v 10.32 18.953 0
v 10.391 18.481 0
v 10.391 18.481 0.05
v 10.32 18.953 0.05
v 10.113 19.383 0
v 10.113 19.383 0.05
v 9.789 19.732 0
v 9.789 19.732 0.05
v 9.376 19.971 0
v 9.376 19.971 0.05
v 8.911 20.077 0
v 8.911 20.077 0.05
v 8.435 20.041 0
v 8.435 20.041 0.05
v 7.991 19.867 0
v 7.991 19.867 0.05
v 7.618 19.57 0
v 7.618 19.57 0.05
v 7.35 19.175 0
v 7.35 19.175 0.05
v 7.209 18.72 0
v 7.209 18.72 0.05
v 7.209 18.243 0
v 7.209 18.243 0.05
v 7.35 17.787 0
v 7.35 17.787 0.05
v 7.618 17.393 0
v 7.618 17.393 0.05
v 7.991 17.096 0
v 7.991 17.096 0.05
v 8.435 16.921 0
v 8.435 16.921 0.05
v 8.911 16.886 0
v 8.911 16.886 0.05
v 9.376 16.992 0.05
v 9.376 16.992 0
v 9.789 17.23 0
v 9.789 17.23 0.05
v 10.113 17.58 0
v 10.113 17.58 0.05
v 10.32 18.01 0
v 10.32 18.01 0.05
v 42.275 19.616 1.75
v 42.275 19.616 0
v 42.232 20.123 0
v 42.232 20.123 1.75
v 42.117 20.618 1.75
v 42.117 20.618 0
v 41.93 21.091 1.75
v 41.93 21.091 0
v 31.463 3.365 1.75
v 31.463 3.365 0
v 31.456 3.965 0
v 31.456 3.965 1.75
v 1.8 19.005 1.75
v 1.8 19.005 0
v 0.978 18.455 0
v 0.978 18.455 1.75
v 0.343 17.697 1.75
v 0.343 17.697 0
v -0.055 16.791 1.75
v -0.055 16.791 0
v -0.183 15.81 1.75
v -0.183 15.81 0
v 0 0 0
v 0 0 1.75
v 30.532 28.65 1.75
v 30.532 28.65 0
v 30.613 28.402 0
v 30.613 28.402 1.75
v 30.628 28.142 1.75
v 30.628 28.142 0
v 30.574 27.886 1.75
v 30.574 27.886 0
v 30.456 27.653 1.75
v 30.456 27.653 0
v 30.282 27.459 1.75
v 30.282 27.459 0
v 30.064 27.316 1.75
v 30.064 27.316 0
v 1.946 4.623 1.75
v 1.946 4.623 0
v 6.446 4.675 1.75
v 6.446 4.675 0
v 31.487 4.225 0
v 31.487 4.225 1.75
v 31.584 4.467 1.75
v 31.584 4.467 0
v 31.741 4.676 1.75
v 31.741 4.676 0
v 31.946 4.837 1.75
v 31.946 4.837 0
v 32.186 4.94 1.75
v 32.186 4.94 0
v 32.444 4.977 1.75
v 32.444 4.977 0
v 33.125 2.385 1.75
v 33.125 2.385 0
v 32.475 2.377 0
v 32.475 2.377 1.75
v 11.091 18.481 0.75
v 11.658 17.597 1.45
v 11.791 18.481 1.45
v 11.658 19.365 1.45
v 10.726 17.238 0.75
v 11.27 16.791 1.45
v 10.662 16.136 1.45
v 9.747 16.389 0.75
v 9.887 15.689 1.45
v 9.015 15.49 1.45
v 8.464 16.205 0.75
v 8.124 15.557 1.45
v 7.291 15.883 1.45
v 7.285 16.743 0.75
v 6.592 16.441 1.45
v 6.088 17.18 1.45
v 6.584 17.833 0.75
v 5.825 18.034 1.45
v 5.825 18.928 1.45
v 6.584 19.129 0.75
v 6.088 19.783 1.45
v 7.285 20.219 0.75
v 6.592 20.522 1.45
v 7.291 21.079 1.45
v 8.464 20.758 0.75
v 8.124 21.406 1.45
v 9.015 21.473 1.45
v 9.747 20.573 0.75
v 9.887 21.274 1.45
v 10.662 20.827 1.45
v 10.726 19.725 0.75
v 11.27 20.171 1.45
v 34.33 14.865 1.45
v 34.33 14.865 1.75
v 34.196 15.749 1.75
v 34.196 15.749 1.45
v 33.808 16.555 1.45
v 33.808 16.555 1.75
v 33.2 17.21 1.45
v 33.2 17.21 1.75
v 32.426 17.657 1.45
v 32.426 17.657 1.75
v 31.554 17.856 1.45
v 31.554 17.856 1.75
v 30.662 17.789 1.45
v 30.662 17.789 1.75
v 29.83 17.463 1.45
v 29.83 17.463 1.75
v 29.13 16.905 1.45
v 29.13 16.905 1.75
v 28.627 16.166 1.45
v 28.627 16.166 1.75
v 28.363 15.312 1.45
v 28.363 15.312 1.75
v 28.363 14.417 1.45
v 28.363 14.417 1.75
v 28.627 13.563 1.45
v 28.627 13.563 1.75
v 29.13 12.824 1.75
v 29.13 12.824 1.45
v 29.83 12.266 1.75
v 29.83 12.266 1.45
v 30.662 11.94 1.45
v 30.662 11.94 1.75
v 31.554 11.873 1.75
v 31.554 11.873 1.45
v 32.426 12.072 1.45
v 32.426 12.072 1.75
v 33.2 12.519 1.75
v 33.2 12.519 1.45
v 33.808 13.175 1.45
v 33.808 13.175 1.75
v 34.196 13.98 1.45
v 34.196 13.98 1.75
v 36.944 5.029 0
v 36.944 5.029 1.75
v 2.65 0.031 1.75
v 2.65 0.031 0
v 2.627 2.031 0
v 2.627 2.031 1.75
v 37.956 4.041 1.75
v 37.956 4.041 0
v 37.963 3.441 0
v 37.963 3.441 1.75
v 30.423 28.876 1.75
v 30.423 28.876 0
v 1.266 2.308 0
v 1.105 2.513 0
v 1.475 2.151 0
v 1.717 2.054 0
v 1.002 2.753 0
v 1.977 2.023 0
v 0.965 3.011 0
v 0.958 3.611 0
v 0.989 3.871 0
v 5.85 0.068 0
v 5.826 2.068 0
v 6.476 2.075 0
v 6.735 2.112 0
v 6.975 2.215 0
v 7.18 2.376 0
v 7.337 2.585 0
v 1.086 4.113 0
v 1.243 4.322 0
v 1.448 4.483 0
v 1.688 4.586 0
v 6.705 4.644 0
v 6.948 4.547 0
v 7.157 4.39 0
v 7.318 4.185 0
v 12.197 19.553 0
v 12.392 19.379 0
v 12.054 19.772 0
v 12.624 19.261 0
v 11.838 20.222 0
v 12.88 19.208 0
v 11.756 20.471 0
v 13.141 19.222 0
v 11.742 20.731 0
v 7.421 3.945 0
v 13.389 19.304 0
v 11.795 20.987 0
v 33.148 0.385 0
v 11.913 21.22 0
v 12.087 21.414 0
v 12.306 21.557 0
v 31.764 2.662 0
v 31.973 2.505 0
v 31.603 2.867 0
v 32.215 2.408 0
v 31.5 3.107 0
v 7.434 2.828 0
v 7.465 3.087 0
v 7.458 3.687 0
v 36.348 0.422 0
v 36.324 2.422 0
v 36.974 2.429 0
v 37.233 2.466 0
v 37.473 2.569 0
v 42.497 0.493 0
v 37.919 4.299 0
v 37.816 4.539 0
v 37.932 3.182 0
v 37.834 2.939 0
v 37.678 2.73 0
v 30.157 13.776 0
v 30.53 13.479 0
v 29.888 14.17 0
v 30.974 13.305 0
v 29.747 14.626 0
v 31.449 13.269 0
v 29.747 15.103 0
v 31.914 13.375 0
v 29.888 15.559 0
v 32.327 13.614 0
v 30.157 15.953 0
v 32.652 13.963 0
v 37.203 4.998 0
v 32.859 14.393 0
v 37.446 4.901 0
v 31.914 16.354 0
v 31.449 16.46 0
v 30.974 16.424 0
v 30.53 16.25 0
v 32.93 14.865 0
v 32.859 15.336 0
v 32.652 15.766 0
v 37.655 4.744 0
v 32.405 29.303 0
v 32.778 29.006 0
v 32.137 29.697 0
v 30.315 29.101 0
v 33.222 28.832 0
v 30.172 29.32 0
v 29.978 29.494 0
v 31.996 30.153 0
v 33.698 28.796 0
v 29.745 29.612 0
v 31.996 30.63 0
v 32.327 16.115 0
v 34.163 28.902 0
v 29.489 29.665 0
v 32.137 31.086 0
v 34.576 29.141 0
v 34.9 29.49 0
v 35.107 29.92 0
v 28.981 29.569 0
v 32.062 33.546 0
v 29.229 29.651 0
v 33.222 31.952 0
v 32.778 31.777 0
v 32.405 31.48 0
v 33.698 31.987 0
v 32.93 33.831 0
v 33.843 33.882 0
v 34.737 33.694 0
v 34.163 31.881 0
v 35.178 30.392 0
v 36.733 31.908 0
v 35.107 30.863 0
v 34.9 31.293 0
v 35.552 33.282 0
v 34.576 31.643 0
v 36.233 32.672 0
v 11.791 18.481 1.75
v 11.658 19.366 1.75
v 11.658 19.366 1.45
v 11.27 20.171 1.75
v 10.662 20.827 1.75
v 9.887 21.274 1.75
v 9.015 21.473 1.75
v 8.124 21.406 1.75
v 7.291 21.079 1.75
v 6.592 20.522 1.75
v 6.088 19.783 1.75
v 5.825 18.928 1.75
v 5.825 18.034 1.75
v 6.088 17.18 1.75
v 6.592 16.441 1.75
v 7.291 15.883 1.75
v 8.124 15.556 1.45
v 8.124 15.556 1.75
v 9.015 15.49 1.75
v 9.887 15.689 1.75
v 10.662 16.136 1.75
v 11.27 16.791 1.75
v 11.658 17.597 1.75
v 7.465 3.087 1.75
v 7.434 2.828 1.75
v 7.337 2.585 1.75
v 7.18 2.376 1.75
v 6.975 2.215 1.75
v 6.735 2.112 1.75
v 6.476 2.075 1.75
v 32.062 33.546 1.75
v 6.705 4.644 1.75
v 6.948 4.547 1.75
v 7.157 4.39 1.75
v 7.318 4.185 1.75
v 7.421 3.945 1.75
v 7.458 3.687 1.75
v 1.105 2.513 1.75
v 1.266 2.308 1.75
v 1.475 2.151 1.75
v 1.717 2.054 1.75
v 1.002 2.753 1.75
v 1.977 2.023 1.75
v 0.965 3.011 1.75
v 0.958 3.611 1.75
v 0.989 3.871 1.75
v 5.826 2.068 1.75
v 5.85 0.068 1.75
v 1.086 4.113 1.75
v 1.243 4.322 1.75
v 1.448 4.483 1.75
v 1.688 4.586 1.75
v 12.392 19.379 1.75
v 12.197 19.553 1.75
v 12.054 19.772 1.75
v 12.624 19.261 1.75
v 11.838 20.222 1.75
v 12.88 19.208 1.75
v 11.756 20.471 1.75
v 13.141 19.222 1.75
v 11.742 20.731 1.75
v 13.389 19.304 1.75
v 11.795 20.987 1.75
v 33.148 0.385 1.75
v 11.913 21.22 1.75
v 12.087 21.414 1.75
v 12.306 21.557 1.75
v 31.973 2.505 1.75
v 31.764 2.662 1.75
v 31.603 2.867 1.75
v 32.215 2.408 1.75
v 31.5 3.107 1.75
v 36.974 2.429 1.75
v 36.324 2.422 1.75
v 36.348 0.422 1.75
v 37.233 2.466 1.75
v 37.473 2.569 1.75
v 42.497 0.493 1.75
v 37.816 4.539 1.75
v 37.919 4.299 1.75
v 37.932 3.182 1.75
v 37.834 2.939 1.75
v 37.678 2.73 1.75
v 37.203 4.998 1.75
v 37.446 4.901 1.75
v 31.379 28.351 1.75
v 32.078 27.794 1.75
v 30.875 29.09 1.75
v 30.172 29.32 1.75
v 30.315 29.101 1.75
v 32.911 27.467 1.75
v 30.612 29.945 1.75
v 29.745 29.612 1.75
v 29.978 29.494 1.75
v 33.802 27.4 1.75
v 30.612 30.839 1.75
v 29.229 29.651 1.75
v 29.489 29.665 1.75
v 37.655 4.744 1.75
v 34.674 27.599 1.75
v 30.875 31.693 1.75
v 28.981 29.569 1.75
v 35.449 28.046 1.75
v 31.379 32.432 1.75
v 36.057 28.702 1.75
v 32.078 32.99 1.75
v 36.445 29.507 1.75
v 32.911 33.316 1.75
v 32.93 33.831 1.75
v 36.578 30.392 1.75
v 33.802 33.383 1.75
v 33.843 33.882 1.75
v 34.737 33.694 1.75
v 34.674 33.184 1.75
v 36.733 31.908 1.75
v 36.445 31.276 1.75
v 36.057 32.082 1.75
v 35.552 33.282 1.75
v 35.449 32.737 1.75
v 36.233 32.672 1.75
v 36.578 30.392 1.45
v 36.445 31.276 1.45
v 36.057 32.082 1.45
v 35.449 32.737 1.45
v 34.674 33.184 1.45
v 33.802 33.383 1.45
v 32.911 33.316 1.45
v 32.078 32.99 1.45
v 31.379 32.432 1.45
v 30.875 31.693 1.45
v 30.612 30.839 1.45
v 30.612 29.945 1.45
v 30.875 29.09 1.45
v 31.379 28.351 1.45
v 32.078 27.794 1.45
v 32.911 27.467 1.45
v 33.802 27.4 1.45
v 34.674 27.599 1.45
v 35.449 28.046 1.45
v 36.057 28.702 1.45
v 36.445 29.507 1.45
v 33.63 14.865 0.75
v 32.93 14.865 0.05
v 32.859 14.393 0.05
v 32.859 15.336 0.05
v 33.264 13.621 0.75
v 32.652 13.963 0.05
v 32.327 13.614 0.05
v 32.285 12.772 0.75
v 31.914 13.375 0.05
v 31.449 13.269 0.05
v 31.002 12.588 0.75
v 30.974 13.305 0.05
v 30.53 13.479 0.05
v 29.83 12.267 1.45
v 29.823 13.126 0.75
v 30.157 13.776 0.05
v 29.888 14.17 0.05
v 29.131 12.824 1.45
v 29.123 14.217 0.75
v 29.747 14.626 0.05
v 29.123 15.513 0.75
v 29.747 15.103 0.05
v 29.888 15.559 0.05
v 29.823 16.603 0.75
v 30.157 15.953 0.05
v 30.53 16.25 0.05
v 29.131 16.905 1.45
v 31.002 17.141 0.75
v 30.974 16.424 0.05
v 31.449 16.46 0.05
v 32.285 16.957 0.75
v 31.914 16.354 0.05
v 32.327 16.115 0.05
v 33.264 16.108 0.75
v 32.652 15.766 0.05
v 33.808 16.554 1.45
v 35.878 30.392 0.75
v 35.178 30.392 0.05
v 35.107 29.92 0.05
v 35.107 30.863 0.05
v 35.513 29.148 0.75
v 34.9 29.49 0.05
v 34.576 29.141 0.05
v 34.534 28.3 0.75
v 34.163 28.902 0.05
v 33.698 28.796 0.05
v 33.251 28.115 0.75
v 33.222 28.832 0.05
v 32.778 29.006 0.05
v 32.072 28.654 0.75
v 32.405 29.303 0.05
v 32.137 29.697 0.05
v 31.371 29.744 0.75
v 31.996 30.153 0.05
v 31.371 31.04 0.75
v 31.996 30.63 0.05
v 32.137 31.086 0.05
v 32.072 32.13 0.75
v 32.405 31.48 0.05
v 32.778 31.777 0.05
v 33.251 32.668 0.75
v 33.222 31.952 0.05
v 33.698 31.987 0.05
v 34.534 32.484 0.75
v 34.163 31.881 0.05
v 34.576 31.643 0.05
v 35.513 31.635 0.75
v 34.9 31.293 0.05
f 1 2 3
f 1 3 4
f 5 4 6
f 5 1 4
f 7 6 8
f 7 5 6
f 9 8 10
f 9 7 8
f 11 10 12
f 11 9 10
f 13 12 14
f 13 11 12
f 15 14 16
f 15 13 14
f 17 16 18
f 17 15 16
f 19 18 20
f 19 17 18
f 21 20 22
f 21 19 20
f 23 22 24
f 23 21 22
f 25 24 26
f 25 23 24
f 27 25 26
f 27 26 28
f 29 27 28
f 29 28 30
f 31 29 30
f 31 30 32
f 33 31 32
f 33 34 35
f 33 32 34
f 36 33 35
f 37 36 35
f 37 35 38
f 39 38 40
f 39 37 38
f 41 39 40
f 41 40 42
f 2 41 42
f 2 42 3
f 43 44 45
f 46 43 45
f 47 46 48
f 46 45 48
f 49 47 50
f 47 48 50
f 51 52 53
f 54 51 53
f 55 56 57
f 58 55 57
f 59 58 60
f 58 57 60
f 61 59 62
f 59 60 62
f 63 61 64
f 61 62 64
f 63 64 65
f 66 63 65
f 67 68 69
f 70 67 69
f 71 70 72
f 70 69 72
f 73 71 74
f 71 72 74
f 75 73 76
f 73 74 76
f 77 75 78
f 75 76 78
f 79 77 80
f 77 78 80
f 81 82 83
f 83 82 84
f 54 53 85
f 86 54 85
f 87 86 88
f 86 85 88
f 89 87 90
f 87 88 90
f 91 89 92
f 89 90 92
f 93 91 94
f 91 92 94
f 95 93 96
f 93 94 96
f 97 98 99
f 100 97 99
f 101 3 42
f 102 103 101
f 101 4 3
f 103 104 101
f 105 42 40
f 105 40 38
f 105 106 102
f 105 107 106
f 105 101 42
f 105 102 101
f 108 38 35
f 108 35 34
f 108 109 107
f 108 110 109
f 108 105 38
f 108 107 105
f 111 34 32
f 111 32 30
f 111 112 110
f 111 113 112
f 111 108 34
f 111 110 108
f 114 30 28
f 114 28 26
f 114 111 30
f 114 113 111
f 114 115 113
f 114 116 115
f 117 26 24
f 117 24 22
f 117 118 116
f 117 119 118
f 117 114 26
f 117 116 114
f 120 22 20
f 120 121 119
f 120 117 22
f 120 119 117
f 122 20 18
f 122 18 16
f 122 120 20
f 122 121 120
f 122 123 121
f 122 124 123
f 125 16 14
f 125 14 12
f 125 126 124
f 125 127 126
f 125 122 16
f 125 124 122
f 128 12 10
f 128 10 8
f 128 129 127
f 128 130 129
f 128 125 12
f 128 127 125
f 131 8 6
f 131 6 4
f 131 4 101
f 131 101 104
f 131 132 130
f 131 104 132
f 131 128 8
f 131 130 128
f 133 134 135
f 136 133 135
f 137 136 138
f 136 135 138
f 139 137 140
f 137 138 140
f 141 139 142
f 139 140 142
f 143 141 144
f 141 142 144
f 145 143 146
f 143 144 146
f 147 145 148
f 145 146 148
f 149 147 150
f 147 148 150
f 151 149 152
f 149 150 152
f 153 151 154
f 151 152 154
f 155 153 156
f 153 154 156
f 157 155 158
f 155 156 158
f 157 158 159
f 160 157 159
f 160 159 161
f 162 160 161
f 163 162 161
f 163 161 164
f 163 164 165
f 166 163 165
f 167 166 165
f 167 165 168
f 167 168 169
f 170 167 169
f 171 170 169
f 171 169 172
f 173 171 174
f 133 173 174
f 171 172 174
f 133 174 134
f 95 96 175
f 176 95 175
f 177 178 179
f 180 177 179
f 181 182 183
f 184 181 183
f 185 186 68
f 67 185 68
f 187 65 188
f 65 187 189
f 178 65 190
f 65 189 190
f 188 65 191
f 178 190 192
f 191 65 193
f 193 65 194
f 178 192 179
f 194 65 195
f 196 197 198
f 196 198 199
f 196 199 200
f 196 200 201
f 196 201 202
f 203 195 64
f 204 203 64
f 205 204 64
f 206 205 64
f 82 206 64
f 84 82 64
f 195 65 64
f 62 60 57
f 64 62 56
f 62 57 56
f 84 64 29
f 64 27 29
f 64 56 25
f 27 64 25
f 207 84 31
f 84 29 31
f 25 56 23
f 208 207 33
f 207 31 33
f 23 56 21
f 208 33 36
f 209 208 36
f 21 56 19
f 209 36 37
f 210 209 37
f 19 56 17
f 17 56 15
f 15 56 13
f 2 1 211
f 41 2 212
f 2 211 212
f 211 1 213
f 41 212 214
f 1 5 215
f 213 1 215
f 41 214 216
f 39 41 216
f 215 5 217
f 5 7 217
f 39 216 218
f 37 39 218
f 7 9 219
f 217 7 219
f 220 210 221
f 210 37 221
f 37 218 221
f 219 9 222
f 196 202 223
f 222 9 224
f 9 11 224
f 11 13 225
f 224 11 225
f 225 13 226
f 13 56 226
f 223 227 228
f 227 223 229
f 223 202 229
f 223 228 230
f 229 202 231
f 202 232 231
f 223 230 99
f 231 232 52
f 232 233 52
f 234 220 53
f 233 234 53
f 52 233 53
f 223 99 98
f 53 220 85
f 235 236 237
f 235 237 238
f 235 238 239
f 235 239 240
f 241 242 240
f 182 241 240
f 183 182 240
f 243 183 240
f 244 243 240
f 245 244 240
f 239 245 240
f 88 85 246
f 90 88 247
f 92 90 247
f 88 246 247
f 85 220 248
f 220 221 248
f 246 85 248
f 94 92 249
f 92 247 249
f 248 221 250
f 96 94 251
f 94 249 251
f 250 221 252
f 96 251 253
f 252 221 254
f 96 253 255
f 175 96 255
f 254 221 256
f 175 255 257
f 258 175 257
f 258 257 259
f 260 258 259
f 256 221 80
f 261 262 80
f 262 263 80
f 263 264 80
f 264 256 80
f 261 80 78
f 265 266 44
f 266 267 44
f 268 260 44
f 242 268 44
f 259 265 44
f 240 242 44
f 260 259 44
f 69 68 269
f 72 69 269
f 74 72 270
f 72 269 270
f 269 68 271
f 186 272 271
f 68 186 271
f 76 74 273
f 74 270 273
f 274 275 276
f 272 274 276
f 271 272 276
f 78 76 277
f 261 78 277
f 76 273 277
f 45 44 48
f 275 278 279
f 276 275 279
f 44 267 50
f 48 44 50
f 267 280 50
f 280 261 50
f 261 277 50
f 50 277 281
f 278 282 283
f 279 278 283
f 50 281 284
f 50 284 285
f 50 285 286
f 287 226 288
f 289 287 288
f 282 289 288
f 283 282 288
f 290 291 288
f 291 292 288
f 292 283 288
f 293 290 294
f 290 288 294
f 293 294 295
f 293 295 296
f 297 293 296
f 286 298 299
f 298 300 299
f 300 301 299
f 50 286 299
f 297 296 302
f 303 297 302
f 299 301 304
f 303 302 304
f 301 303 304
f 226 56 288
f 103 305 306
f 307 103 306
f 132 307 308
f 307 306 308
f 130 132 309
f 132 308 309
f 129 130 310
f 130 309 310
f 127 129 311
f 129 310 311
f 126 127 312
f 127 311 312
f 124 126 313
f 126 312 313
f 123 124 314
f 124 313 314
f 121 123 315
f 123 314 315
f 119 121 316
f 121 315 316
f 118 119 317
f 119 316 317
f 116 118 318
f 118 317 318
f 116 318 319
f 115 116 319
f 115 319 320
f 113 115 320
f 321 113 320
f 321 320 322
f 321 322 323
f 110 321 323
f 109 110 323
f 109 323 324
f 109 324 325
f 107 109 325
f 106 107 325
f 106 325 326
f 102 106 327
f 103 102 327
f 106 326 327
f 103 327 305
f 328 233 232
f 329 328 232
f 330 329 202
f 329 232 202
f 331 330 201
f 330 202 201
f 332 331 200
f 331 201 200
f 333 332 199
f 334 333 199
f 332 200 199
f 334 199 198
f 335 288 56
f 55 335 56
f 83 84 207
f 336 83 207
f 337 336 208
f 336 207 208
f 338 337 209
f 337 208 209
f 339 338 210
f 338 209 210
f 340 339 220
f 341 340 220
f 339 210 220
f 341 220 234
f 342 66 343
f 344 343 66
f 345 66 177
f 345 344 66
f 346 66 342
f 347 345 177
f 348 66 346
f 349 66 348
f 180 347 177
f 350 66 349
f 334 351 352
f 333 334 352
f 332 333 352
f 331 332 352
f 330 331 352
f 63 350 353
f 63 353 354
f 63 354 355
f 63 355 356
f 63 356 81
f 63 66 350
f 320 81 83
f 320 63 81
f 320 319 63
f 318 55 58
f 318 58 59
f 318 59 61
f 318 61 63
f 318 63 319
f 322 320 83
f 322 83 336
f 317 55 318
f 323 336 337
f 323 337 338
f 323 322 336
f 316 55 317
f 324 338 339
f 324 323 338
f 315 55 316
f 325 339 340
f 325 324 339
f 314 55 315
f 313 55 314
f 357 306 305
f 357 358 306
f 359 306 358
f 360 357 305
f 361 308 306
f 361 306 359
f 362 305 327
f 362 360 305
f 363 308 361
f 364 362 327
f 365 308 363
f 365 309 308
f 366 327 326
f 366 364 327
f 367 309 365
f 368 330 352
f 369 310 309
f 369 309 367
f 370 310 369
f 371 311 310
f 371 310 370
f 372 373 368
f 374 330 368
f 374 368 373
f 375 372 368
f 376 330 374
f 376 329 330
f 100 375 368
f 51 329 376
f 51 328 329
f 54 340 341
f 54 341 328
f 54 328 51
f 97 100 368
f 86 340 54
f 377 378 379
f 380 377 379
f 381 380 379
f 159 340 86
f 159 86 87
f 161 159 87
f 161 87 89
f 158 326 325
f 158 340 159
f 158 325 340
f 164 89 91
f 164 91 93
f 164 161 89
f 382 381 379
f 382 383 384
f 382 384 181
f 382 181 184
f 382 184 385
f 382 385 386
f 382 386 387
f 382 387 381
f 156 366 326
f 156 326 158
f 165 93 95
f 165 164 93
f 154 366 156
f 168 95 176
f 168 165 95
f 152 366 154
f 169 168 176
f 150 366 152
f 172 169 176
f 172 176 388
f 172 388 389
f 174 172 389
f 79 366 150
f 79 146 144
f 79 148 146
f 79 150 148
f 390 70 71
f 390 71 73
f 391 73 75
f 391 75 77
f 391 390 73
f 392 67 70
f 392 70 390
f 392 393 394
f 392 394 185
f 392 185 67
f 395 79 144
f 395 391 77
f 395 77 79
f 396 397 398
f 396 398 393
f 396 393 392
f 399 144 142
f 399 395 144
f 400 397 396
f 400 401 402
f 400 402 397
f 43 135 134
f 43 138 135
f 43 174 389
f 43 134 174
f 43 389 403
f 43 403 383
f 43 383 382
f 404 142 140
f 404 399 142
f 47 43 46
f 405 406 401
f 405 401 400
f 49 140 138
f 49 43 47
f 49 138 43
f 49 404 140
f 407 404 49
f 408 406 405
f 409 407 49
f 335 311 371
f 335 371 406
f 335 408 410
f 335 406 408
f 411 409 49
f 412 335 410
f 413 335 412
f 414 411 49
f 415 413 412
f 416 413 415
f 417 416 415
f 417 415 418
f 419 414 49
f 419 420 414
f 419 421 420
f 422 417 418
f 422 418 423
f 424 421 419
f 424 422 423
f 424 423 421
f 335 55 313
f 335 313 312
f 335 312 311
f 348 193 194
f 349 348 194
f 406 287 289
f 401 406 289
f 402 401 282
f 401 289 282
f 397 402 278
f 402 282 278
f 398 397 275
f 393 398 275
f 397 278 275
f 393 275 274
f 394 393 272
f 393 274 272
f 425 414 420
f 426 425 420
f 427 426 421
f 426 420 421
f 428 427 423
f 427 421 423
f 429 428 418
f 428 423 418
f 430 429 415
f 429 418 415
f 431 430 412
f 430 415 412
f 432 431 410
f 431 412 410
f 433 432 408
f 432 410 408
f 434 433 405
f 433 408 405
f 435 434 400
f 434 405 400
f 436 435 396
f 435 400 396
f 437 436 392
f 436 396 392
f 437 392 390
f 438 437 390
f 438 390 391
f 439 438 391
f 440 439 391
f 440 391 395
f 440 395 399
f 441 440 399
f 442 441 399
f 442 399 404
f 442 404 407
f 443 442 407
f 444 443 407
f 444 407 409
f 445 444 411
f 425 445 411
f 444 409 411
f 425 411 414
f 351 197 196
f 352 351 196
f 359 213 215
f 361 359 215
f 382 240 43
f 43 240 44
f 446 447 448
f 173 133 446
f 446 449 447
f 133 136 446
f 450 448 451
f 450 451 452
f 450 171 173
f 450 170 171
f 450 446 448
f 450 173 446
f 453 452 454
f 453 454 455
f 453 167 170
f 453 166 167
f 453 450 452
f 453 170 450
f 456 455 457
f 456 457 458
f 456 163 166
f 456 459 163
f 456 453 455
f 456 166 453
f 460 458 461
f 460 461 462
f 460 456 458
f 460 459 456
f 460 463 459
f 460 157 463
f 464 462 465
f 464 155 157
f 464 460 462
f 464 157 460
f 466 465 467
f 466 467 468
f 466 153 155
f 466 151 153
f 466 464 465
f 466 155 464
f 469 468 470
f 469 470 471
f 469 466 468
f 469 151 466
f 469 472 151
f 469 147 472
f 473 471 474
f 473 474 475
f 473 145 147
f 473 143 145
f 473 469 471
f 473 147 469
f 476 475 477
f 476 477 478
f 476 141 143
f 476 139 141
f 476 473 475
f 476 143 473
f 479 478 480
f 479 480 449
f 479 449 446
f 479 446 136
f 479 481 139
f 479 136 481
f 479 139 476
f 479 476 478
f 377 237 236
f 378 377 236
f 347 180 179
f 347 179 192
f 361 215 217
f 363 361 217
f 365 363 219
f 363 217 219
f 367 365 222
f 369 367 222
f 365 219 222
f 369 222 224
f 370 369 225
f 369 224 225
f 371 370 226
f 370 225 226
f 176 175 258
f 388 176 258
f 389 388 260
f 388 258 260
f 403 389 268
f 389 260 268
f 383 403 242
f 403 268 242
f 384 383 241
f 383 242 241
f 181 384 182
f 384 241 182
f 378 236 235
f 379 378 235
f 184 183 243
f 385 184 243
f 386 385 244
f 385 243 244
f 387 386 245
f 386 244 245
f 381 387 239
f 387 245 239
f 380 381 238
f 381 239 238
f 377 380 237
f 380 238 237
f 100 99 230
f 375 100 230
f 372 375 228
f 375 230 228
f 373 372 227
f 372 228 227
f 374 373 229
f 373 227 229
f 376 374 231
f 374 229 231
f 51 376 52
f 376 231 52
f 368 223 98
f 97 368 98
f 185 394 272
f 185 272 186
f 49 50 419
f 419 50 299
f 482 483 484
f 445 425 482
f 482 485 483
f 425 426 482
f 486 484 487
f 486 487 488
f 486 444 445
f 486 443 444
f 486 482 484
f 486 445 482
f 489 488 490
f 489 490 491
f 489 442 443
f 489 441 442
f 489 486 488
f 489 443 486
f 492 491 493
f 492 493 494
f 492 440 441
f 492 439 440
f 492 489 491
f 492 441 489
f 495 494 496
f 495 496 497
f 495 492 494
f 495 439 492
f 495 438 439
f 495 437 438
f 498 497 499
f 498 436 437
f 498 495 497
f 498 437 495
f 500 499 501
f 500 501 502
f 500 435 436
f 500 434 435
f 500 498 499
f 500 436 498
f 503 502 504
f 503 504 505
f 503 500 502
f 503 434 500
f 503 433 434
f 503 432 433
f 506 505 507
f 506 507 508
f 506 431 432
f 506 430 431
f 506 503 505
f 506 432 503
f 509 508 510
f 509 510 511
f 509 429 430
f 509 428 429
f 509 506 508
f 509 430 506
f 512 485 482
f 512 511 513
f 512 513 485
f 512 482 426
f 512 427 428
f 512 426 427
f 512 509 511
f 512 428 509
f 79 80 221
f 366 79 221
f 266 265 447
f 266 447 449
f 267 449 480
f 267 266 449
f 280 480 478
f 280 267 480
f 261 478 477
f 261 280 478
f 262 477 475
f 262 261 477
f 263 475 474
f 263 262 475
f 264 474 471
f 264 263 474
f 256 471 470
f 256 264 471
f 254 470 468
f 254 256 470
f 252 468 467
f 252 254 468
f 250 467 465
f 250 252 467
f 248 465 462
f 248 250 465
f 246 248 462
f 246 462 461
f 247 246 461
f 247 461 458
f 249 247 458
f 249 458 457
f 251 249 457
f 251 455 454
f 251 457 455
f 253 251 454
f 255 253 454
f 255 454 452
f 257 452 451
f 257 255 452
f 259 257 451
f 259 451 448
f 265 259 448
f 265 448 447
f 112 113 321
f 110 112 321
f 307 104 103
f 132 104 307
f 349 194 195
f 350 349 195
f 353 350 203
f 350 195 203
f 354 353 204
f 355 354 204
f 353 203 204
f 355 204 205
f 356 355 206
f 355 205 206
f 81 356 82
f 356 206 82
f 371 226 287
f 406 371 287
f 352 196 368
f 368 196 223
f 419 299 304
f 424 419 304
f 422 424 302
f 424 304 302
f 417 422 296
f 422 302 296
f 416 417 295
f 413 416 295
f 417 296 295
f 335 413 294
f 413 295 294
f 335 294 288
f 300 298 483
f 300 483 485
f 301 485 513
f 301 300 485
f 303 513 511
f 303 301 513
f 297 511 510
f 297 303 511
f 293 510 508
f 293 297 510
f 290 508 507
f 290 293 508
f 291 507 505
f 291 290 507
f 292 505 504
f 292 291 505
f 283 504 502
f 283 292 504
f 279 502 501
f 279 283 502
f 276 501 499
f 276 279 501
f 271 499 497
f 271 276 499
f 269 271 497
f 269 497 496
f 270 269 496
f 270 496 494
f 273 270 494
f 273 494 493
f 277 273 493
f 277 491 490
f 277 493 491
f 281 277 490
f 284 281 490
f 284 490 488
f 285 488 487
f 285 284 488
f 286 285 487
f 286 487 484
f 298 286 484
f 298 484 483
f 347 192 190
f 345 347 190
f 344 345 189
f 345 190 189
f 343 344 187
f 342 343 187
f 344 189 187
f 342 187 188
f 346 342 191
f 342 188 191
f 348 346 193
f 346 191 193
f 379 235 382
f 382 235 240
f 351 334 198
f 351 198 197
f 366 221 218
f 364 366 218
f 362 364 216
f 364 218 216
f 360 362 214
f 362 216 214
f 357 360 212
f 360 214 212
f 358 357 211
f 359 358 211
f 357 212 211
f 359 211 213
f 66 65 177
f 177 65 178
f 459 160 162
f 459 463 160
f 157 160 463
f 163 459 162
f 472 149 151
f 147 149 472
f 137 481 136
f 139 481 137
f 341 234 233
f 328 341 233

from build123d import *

# Parameters (mm, degrees)
SKETCH2_R           = 1.6
SKETCH2_R_2         = 3.5
BOSS_EXTRUDE1_DEPTH = 1.75
SKETCH3_R           = 3
CUT_EXTRUDE2_DEPTH  = 0.3
CHAMFER1_SIZE       = 1.4


with BuildPart() as part:
    # Sketch2 → Boss-Extrude1 (new body)
    # profile 1 of 4: a face of its own
    with BuildSketch(Plane(origin=(277.94406545, -368.782269, 0), x_dir=(0.99993266408239, 0.011604624125499034, 0), z_dir=(0, 0, 1))):
        with BuildLine():
            Line((-273.645770216, 387.793792834), (-273.645770216, 371.982873115))
            Line((-273.645770216, 371.982873115), (-270.995770216, 371.982873115))
            Line((-270.995770216, 371.982873115), (-270.995770216, 373.982873115))
            Line((-270.995770216, 373.982873115), (-271.645770216, 373.982873115))
            ThreePointArc((-271.645770216, 373.982873115), (-272.352876997, 374.275766334), (-272.645770216, 374.982873115))
            Line((-272.645770216, 374.982873115), (-272.645770216, 375.582873115))
            ThreePointArc((-272.645770216, 375.582873115), (-272.352876997, 376.289979896), (-271.645770216, 376.582873115))
            Line((-271.645770216, 376.582873115), (-267.145770216, 376.582873115))
            ThreePointArc((-267.145770216, 376.582873115), (-266.438663434, 376.289979896), (-266.145770216, 375.582873115))
            Line((-266.145770216, 375.582873115), (-266.145770216, 374.982873115))
            ThreePointArc((-266.145770216, 374.982873115), (-266.438663434, 374.275766334), (-267.145770216, 373.982873115))
            Line((-267.145770216, 373.982873115), (-267.795770216, 373.982873115))
            Line((-267.795770216, 373.982873115), (-267.795770216, 371.982873115))
            Line((-267.795770216, 371.982873115), (-240.495770216, 371.982873115))
            Line((-240.495770216, 371.982873115), (-240.495770216, 373.982873115))
            Line((-240.495770216, 373.982873115), (-241.145770216, 373.982873115))
            ThreePointArc((-241.145770216, 373.982873115), (-241.852876997, 374.275766334), (-242.145770216, 374.982873115))
            Line((-242.145770216, 374.982873115), (-242.145770216, 375.582873115))
            ThreePointArc((-242.145770216, 375.582873115), (-241.852876997, 376.289979896), (-241.145770216, 376.582873115))
            Line((-241.145770216, 376.582873115), (-236.645770216, 376.582873115))
            ThreePointArc((-236.645770216, 376.582873115), (-235.938663434, 376.289979896), (-235.645770216, 375.582873115))
            Line((-235.645770216, 375.582873115), (-235.645770216, 374.982873115))
            ThreePointArc((-235.645770216, 374.982873115), (-235.938663434, 374.275766334), (-236.645770216, 373.982873115))
            Line((-236.645770216, 373.982873115), (-237.295770216, 373.982873115))
            Line((-237.295770216, 373.982873115), (-237.295770216, 371.982873115))
            Line((-237.295770216, 371.982873115), (-231.145770216, 371.982873115))
            Line((-231.145770216, 371.982873115), (-231.145770216, 391.107179671))
            ThreePointArc((-231.145770216, 391.107179671), (-238.062806241, 390.349641022), (-231.473692961, 392.586343587))
            Line((-231.473692961, 392.586343587), (-236.545112102, 403.462037031))
            ThreePointArc((-236.545112102, 403.462037031), (-236.300153332, 402.740411764), (-236.217189356, 401.982873115))
            ThreePointArc((-236.217189356, 401.982873115), (-238.959651202, 398.565836981), (-242.889267039, 400.503710116))
            ThreePointArc((-242.889267039, 400.503710116), (-243.006113356, 403.179944092), (-241.196353273, 405.15495037))
            Line((-241.196353273, 405.15495037), (-271.624933816, 390.965870235))
            ThreePointArc((-271.624933816, 390.965870235), (-268.26522144, 390.745662801), (-266.645770216, 387.793792834))
            ThreePointArc((-266.645770216, 387.793792834), (-270.145770216, 384.293792834), (-273.645770216, 387.793792834))
        make_face()
        with Locations(Location((-242.145770216, 386.482873115, 0), (0, 0, 359.335089091))):
            Circle(SKETCH2_R, mode=Mode.SUBTRACT)
        with Locations(Location((-264.6406535, 390.360870917, 0), (0, 0, 359.335089091))):
            Circle(SKETCH2_R, mode=Mode.SUBTRACT)
        with BuildLine():
            Line((-242.994921177, 400.730286146), (-242.889267039, 400.503710116))
            Line((-242.889267039, 400.503710116), (-242.783612046, 400.277132252))
            ThreePointArc((-242.783612046, 400.277132252), (-242.750227212, 399.512493847), (-243.267301571, 398.948206203))
            Line((-243.267301571, 398.948206203), (-260.033995631, 391.129768361))
            ThreePointArc((-260.033995631, 391.129768361), (-260.798634036, 391.096383528), (-261.36292168, 391.613457887))
            Line((-261.36292168, 391.613457887), (-261.574230811, 392.06661178))
            ThreePointArc((-261.574230811, 392.06661178), (-261.607615645, 392.831250185), (-261.090541285, 393.395537829))
            Line((-261.090541285, 393.395537829), (-244.323847225, 401.213975671))
            ThreePointArc((-244.323847225, 401.213975671), (-243.55920882, 401.247360505), (-242.994921177, 400.730286146))
        make_face(mode=Mode.SUBTRACT)
    # profile 2 of 4: a face of its own
    with BuildSketch(Plane(origin=(277.94406545, -368.782269, 0), x_dir=(0.99993266408239, 0.011604624125499034, 0), z_dir=(0, 0, 1))):
        with Locations((-270.145770216, 387.793792834)):
            Circle(SKETCH2_R_2)
    # profile 3 of 4: a face of its own
    with BuildSketch(Plane(origin=(277.94406545, -368.782269, 0), x_dir=(0.99993266408239, 0.011604624125499034, 0), z_dir=(0, 0, 1))):
        with Locations((-234.645770216, 391.107179671)):
            Circle(SKETCH2_R_2)
    # profile 4 of 4: a face of its own
    with BuildSketch(Plane(origin=(277.94406545, -368.782269, 0), x_dir=(0.99993266408239, 0.011604624125499034, 0), z_dir=(0, 0, 1))):
        with Locations((-239.717189356, 401.982873115)):
            Circle(SKETCH2_R_2)
        with Locations(Location((-239.717189356, 401.982873115, 0), (0, 0, 359.335089091))):
            Circle(SKETCH2_R, mode=Mode.SUBTRACT)
    extrude(amount=BOSS_EXTRUDE1_DEPTH)

    # Sketch3 → Cut-Extrude2 (cut)
    with BuildSketch(Plane.XY.offset(1.75)):
        with Locations((8.791240591, 18.481261297)):
            Circle(SKETCH3_R)
        with Locations((31.329611869, 14.864569289)):
            Circle(SKETCH3_R)
        with Locations((33.578157523, 30.39170835)):
            Circle(SKETCH3_R)
    extrude(amount=-CUT_EXTRUDE2_DEPTH, mode=Mode.SUBTRACT)

    # Chamfer1
    chamfer1_edges = [part.edges().sort_by_distance(p)[0] for p in [
        (7.191240591, 18.481261297, 1.45),
        (29.729611869, 14.864569289, 1.45),
        (31.978157523, 30.39170835, 1.45),
    ]]
    chamfer(chamfer1_edges, length=CHAMFER1_SIZE - 0.0001)  # a hair under: the kernel refuses the full size


solid = part.part
